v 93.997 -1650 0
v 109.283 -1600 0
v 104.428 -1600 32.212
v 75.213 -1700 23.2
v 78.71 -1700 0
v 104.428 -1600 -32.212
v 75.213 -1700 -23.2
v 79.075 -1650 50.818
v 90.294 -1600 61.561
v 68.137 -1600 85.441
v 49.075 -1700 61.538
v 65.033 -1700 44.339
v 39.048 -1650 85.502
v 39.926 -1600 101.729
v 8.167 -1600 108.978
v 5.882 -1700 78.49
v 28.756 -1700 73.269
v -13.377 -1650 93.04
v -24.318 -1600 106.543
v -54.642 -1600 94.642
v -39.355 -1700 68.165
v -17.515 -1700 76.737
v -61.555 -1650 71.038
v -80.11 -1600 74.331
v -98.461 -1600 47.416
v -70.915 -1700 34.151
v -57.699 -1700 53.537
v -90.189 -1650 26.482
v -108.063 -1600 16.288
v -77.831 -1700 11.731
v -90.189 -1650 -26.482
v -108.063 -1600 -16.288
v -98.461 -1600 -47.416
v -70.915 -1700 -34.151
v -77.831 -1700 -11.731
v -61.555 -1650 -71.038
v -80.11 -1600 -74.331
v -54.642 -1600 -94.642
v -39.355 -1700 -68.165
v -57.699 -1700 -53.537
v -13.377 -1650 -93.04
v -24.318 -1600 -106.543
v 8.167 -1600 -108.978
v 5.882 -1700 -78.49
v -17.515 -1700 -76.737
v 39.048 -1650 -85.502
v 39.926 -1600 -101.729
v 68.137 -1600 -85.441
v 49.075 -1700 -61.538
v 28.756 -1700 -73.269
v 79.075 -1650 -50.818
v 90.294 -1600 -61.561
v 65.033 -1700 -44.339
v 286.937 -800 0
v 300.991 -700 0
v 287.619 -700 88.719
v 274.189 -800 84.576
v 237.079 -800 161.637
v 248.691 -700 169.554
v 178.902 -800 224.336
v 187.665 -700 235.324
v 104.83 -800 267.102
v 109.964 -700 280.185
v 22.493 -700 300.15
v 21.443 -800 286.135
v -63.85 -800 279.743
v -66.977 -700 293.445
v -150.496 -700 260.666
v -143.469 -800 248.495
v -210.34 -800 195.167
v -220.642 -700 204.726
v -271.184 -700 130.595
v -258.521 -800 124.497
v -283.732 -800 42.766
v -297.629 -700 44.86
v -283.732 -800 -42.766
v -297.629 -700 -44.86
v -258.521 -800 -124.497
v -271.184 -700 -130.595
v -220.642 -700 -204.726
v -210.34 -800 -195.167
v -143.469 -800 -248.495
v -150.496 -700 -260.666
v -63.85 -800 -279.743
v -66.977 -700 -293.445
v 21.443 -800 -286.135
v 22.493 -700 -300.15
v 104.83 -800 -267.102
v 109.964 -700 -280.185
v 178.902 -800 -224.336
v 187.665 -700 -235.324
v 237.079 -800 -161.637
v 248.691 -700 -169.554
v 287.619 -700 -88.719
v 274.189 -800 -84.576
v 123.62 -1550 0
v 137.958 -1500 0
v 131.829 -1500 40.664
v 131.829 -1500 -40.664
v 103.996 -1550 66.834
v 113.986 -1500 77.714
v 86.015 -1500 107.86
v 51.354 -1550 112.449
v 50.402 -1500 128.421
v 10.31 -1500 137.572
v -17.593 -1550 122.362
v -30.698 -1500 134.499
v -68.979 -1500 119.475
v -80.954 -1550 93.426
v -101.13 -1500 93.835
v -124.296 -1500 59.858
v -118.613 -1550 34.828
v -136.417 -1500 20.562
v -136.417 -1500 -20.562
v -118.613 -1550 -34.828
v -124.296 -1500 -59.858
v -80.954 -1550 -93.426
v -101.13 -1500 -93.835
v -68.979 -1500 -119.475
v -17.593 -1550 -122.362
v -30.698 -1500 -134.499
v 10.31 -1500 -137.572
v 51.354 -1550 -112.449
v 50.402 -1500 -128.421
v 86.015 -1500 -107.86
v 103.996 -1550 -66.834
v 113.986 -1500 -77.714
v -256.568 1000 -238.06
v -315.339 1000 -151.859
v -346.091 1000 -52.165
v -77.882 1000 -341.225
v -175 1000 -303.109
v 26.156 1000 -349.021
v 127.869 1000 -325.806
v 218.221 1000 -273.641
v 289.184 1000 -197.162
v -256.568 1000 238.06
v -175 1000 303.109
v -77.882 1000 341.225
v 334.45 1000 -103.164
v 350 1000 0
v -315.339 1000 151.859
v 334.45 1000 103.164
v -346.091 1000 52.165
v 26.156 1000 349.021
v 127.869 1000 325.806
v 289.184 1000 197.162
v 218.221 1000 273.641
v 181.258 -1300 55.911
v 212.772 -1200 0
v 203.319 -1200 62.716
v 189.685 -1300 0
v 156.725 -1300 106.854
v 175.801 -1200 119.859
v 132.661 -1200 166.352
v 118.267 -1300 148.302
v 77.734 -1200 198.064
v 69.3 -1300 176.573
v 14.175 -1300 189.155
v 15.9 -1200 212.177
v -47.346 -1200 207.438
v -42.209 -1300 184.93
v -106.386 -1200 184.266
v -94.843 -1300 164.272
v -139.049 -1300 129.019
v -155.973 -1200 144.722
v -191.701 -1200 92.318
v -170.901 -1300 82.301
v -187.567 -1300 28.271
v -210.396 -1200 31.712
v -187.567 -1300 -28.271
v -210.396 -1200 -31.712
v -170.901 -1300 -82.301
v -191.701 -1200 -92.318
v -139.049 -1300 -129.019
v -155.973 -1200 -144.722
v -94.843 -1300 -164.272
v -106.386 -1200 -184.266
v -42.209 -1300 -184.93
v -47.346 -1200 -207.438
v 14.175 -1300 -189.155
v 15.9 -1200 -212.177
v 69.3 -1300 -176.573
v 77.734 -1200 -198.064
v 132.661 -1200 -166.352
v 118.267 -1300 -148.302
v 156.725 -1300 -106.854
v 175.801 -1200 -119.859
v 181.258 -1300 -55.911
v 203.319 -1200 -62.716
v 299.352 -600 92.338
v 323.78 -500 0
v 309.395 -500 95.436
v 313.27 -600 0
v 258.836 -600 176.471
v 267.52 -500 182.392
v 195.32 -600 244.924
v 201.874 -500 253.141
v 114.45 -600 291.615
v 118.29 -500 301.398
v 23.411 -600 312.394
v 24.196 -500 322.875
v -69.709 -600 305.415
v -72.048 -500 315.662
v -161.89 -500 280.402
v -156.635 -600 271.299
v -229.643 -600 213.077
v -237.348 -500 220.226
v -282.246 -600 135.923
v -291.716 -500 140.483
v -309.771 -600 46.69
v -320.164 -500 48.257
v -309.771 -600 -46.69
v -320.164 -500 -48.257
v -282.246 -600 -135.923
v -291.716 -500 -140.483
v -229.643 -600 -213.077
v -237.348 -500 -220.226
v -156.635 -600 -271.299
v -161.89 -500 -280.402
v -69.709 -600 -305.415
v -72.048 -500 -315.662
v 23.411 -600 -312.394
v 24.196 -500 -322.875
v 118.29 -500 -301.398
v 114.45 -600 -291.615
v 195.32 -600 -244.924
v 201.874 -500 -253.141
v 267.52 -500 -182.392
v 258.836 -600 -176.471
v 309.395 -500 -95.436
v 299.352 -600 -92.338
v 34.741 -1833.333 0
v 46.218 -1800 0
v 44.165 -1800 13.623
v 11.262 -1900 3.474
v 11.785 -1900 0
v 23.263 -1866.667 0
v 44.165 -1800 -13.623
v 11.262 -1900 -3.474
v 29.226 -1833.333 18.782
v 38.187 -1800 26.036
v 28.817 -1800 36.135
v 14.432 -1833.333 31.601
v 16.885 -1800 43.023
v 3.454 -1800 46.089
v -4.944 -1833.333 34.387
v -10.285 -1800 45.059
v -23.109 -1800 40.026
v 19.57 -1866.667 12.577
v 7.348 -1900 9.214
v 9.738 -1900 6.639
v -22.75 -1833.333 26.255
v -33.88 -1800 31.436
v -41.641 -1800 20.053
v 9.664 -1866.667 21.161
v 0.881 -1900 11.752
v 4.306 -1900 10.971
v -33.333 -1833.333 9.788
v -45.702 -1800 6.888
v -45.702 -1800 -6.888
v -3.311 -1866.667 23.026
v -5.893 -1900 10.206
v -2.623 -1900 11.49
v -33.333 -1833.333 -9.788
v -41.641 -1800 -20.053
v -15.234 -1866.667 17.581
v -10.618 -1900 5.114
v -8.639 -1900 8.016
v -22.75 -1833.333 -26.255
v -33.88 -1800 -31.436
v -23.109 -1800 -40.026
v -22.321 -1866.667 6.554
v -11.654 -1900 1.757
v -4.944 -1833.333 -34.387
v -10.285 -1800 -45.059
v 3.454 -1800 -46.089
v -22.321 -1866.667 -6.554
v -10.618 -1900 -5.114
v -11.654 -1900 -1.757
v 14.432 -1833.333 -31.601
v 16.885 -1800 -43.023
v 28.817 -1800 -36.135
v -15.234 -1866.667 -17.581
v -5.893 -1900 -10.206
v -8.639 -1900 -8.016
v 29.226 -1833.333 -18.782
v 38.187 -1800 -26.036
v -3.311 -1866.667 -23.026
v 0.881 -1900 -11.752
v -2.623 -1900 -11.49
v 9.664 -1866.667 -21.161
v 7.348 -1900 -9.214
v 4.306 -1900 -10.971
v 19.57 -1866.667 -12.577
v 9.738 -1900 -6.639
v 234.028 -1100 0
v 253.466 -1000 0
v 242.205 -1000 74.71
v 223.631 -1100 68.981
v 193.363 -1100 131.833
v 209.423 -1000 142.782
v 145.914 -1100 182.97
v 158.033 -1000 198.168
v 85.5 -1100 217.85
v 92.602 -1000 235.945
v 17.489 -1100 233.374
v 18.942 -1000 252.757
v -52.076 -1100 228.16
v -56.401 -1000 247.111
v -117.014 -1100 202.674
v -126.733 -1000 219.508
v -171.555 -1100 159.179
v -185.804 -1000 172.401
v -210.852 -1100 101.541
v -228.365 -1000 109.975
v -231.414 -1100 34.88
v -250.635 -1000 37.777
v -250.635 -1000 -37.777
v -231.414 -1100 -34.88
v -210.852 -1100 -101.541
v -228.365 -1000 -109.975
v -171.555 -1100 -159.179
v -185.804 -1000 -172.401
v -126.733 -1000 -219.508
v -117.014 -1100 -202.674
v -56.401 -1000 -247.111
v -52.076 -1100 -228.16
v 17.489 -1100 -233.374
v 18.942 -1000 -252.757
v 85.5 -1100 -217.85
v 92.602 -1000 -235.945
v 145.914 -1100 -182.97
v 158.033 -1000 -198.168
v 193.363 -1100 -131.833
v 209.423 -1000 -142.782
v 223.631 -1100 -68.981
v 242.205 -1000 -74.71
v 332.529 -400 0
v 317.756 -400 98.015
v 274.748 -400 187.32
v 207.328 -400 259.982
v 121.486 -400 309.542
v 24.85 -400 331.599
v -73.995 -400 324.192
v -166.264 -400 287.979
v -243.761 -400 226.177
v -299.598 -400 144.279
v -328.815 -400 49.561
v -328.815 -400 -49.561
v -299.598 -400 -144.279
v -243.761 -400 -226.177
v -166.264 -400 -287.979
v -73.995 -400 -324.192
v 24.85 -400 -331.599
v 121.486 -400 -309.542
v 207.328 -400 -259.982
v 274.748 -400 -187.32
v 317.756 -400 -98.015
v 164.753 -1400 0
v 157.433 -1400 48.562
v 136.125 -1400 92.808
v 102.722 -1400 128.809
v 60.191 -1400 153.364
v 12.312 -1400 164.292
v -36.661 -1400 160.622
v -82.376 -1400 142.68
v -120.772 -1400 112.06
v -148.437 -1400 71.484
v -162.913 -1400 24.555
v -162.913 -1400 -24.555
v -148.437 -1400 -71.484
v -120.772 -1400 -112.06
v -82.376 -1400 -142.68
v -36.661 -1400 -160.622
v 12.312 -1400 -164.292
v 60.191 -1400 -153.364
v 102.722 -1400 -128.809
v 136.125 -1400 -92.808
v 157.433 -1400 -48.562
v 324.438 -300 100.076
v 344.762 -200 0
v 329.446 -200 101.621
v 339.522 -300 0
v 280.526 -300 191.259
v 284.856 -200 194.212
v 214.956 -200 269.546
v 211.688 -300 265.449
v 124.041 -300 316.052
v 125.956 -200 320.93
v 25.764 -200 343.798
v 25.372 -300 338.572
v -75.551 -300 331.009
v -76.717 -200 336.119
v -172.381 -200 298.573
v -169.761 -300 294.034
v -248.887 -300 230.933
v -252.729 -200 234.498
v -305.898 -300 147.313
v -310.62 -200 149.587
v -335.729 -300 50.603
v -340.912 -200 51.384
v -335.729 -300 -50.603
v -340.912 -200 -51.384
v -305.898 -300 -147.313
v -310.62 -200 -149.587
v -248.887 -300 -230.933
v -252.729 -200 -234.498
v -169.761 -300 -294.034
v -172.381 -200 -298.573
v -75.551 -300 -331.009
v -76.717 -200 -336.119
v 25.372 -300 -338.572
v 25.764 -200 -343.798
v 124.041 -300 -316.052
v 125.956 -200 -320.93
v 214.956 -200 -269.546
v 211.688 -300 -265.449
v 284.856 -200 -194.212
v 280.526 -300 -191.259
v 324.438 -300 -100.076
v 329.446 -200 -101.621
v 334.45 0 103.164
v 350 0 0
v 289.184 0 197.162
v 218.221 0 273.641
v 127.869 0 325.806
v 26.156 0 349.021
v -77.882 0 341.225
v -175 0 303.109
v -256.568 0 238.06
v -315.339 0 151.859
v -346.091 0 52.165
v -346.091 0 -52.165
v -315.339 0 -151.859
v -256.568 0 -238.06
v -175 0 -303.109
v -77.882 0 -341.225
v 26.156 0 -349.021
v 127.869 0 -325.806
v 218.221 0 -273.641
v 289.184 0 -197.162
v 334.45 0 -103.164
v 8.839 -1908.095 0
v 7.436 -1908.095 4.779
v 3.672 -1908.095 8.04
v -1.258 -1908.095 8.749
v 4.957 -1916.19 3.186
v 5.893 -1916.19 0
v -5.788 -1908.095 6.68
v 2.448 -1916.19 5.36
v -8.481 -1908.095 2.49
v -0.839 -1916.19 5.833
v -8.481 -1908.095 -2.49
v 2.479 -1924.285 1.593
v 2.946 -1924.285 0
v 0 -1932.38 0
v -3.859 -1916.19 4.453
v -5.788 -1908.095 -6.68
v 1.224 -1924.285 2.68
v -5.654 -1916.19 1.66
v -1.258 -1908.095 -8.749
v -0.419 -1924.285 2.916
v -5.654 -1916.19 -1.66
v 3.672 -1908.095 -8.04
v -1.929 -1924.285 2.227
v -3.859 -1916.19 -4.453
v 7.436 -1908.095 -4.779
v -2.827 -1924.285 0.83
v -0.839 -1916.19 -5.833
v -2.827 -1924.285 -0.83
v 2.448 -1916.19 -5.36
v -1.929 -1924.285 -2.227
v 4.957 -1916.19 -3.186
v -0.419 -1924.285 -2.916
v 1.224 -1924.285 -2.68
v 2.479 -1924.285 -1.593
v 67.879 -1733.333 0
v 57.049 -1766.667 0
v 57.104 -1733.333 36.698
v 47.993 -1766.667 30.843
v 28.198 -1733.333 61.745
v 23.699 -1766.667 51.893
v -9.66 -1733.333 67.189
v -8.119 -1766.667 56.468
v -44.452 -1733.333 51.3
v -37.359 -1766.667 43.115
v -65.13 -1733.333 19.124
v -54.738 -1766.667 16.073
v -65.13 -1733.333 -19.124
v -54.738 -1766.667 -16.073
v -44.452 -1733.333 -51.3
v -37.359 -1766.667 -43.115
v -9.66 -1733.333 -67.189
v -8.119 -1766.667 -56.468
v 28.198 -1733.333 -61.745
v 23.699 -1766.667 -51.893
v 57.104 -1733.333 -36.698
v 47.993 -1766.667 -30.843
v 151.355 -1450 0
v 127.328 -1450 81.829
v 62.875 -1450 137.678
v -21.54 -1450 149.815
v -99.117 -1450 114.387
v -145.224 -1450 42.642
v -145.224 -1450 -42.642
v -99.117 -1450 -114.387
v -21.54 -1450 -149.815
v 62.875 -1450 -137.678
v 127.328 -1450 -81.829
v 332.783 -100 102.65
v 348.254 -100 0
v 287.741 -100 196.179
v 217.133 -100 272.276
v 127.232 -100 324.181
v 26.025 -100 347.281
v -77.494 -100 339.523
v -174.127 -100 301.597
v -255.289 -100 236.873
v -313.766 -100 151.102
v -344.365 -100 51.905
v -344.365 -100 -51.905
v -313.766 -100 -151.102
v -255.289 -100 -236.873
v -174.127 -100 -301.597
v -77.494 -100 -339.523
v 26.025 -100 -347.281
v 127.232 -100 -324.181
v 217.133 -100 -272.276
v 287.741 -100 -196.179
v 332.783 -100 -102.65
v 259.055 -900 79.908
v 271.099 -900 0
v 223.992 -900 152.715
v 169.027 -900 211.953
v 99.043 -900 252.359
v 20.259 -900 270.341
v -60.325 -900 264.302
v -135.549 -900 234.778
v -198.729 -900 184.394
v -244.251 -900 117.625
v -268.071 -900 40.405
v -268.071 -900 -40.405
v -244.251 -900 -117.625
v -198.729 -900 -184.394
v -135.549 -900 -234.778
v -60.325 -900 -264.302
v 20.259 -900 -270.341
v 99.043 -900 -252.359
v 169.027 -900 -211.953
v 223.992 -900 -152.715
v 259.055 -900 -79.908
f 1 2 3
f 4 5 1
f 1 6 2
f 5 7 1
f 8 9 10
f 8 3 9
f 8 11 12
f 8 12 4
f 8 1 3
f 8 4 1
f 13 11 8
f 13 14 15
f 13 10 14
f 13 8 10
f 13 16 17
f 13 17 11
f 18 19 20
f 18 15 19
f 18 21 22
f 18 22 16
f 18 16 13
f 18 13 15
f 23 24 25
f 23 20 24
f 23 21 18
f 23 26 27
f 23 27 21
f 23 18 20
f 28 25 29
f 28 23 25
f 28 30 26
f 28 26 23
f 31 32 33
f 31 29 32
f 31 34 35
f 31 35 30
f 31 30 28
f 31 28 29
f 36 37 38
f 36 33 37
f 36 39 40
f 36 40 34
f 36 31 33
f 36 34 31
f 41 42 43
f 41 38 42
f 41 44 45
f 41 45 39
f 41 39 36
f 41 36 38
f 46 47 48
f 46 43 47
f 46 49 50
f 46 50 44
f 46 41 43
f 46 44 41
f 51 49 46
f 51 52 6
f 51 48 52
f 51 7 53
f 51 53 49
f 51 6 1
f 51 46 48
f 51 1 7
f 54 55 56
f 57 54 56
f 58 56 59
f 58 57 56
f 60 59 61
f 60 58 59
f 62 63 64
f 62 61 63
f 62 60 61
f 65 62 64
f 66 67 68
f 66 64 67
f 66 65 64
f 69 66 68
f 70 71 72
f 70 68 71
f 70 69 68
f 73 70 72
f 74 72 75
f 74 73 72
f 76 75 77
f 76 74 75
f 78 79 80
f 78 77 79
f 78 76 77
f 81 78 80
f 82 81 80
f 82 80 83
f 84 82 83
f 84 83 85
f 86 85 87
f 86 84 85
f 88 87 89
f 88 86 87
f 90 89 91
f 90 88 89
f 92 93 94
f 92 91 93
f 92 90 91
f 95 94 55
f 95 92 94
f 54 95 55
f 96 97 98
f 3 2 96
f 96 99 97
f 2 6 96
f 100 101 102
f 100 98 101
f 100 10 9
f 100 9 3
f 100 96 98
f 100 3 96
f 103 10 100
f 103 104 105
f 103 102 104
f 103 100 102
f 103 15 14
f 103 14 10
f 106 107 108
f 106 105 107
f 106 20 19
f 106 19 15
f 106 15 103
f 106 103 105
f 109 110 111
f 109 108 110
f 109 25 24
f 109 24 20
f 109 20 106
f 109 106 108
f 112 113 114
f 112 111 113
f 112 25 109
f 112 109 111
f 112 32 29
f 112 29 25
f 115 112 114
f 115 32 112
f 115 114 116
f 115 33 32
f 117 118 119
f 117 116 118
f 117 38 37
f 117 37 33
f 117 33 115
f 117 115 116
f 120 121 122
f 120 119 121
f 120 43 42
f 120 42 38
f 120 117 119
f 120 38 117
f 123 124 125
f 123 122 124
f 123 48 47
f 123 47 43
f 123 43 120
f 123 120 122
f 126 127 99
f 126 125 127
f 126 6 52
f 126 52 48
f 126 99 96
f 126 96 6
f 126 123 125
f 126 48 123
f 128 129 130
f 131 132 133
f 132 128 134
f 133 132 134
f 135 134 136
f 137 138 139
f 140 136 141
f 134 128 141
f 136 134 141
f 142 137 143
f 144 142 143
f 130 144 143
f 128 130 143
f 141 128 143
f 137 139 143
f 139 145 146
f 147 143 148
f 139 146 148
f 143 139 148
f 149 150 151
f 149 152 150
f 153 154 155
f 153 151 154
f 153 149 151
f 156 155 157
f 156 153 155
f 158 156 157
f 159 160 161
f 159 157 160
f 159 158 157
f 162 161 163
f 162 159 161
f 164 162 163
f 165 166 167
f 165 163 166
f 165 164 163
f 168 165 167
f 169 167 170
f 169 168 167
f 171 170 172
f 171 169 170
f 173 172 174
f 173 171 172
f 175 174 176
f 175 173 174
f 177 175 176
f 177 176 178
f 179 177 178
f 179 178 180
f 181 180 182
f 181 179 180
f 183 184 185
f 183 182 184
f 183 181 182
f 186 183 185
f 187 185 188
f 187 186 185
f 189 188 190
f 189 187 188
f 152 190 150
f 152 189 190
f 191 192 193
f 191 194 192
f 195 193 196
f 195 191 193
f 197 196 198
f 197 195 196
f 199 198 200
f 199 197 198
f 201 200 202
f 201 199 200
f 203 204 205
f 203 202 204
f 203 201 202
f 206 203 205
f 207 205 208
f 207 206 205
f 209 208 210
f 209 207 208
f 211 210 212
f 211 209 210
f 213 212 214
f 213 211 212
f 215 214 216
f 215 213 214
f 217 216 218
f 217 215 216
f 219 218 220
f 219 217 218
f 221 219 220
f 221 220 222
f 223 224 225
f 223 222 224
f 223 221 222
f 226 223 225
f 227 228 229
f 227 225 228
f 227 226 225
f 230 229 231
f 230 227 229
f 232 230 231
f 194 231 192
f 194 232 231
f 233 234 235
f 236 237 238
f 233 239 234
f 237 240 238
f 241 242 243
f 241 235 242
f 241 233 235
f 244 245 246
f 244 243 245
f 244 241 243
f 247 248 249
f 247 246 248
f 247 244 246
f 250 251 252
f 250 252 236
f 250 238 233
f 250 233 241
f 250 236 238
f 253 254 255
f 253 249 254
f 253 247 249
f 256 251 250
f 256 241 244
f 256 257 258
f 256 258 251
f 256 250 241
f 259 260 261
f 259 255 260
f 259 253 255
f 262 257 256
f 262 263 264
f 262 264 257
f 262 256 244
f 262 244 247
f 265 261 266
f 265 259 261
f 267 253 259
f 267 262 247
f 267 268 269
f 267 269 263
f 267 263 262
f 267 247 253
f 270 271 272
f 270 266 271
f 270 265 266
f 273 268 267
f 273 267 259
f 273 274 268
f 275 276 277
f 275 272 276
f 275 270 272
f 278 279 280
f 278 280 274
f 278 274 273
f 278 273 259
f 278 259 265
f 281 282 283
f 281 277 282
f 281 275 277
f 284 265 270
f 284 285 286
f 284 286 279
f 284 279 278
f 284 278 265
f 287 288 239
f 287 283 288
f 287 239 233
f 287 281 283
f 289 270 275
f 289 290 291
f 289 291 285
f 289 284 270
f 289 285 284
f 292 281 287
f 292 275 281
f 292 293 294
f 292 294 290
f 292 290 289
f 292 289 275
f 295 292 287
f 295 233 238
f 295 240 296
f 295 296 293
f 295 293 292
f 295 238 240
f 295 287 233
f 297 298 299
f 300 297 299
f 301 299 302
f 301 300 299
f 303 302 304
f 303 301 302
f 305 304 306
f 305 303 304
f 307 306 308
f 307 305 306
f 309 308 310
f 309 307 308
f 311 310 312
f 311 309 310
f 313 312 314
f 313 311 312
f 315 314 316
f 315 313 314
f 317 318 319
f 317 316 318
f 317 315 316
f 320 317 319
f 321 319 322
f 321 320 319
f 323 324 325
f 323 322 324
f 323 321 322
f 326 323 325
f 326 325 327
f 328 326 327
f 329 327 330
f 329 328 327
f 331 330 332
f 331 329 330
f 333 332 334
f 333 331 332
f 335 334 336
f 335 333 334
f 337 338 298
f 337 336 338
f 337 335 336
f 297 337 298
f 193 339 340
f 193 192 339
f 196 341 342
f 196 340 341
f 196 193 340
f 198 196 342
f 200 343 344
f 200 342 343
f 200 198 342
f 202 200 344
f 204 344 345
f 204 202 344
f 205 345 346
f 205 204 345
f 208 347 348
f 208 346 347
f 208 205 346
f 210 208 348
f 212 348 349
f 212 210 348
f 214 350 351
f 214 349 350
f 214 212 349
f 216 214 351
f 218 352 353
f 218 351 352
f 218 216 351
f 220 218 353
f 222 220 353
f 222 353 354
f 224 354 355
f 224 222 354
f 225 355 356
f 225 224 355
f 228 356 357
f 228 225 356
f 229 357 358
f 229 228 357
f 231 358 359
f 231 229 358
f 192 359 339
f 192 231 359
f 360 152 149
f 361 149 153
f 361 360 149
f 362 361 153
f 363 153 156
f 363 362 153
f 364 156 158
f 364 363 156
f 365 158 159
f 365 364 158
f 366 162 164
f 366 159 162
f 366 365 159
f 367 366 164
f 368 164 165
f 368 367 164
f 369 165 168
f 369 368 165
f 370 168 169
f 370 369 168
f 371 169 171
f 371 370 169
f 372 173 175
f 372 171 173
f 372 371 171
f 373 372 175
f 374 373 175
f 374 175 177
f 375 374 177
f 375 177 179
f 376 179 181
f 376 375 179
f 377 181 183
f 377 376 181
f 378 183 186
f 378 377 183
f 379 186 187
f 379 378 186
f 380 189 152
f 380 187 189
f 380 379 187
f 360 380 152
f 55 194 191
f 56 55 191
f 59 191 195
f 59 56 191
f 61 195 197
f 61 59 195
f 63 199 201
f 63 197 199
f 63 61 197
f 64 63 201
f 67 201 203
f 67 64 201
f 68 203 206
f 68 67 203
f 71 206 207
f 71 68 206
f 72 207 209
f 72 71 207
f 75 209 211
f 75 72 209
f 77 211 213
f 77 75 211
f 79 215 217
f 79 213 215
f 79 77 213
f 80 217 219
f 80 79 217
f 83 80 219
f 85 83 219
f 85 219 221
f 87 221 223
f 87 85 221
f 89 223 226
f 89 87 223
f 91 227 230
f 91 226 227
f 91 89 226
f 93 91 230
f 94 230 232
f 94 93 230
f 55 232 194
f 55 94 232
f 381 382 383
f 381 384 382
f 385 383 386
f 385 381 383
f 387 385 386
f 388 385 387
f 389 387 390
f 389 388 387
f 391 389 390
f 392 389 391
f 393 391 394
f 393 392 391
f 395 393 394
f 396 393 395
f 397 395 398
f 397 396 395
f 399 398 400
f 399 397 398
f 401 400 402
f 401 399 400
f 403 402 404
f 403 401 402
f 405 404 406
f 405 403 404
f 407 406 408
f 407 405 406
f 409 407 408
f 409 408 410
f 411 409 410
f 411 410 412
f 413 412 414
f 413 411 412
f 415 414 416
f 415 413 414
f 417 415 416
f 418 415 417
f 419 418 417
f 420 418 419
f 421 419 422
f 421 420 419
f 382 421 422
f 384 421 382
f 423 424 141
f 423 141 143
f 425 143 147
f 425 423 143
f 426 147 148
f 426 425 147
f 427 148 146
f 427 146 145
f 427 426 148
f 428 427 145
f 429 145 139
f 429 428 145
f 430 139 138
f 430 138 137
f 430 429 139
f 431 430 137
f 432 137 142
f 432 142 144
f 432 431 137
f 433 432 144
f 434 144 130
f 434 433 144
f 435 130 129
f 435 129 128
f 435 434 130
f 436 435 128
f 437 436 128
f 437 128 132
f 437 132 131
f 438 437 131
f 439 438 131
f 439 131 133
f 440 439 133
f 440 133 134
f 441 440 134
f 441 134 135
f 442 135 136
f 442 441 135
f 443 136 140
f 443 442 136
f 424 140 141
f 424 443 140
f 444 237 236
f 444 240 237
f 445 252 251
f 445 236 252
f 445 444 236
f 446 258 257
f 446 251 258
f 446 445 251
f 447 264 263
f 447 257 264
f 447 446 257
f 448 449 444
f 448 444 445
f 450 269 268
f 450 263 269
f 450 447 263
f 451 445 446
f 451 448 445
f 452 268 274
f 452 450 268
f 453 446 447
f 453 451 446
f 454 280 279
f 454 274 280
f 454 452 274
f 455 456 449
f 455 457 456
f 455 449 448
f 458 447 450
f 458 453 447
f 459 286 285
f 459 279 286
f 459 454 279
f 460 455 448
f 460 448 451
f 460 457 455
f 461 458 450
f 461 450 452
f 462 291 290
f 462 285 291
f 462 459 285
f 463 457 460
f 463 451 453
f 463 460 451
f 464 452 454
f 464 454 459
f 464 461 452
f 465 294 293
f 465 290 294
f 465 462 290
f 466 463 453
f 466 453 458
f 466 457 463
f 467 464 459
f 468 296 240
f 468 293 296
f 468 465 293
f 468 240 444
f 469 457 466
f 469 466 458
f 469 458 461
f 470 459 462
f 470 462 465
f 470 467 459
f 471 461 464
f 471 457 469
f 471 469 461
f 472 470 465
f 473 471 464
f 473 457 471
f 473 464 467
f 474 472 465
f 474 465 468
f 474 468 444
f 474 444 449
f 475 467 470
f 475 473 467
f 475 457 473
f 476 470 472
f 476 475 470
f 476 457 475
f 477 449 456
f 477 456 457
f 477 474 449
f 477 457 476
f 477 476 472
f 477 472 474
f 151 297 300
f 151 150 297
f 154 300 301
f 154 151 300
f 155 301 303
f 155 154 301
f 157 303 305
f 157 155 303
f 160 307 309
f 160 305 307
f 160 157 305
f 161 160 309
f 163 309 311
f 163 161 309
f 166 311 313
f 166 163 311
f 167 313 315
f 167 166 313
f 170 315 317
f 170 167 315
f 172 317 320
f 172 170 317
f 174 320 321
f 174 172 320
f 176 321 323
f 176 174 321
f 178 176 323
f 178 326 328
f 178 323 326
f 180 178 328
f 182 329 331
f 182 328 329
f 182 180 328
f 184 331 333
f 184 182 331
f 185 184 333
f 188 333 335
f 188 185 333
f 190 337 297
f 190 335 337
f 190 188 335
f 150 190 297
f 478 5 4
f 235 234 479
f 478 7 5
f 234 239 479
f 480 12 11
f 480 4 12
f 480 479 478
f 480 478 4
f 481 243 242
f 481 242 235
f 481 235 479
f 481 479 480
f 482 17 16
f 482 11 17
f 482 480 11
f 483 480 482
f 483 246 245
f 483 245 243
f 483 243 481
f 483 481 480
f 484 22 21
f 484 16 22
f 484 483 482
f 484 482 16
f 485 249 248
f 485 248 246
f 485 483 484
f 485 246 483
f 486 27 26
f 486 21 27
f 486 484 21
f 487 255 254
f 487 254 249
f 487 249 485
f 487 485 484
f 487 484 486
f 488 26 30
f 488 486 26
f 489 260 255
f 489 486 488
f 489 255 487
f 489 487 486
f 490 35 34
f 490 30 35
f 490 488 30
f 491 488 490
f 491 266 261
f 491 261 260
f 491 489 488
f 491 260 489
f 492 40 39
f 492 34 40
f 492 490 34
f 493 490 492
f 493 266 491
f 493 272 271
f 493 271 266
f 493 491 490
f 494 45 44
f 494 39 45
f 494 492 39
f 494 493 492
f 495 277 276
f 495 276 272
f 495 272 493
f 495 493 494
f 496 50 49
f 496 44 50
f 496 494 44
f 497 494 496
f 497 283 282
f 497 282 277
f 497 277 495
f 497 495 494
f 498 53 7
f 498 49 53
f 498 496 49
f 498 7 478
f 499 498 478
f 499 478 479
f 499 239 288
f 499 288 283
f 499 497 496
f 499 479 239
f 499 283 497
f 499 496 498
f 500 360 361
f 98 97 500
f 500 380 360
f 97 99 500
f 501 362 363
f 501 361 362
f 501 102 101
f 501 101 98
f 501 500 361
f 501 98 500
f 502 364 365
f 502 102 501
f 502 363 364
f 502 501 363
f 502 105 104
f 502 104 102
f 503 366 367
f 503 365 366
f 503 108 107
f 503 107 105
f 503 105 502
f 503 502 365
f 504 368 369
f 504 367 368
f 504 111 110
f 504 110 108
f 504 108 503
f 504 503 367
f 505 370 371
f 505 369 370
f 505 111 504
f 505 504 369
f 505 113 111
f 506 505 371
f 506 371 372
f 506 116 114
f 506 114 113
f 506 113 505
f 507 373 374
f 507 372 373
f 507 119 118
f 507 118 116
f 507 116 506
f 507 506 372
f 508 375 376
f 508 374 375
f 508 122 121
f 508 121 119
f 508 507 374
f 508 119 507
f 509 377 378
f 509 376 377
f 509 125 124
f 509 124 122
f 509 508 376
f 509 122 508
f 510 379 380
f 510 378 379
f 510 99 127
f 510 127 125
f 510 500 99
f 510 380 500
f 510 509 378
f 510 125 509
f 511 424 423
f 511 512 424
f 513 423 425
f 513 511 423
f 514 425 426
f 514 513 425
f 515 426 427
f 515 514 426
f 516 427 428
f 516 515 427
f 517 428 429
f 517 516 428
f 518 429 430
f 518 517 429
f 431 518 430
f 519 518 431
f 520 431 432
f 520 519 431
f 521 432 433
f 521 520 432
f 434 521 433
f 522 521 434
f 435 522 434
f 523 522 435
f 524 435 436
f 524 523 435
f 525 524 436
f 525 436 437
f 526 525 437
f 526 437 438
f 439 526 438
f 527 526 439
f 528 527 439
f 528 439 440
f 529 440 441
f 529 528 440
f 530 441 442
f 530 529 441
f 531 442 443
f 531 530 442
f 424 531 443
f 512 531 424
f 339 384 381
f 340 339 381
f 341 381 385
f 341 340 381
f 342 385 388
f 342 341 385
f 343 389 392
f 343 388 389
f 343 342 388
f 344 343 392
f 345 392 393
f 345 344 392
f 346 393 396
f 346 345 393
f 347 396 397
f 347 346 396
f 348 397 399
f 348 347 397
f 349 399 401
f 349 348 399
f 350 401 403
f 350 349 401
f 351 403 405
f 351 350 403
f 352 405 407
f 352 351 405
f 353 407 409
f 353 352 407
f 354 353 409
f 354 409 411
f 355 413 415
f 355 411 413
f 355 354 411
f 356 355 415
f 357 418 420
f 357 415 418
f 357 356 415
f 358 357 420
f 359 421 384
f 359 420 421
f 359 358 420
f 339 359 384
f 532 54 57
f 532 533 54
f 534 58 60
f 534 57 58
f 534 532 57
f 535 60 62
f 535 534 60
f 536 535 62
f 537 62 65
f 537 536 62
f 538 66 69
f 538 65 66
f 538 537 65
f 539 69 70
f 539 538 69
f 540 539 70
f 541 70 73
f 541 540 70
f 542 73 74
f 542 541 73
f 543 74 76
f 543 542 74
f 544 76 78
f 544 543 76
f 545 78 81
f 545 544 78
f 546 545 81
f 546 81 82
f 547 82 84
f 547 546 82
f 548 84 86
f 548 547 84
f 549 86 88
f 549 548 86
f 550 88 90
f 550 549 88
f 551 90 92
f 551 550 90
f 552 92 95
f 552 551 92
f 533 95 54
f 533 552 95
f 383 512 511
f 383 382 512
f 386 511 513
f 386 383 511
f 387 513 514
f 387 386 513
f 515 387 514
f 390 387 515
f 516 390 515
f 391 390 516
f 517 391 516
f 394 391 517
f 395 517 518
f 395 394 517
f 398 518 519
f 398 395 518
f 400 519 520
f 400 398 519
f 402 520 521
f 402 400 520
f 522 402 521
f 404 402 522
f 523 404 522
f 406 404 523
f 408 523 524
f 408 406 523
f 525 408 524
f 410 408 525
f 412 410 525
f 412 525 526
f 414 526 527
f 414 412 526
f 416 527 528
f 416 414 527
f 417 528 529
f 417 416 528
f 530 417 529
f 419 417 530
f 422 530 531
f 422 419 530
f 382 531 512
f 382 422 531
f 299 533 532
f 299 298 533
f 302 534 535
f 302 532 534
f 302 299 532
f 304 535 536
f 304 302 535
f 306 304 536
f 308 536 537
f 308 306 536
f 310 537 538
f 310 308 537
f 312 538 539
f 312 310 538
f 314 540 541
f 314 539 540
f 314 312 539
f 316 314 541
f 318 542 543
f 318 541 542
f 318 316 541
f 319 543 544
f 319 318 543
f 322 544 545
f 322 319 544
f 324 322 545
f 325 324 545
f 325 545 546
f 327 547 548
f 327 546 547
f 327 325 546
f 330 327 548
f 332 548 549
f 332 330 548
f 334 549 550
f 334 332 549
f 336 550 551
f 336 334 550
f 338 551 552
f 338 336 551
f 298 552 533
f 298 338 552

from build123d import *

# Parameters (mm, degrees)
F0_R       = 350
F1_DEPTH   = 100
F1_TAPER   = 1
F1_FACE_R  = 348.2544935072
F2_DEPTH   = 100
F2_TAPER   = 2
F2_FACE_R  = 344.762416558
F3_DEPTH   = 100
F3_TAPER   = 3
F3_FACE_R  = 339.5216386297
F4_DEPTH   = 100
F4_TAPER   = 4
F4_FACE_R  = 332.5289574353
F5_DEPTH   = 100
F5_TAPER   = 5
F5_FACE_R  = 323.7800910828
F6_DEPTH   = 100
F6_TAPER   = 6
F6_FACE_R  = 313.2696675562
F7_DEPTH   = 100
F7_TAPER   = 7
F7_FACE_R  = 300.9912114659
F8_DEPTH   = 100
F8_TAPER   = 8
F8_FACE_R  = 286.9371279957
F9_DEPTH   = 100
F9_TAPER   = 9
F9_FACE_R  = 271.0986839632
F10_DEPTH  = 100
F10_TAPER  = 10
F10_FACE_R = 253.4659858924
F11_DEPTH  = 100
F11_TAPER  = 11
F11_FACE_R = 234.0279549786
F12_DEPTH  = 100
F12_TAPER  = 12
F12_FACE_R = 212.7722988116
F13_DEPTH  = 100
F13_TAPER  = 13
F13_FACE_R = 189.685479699
F14_DEPTH  = 100
F14_TAPER  = 14
F14_FACE_R = 164.7526794147
F15_DEPTH  = 100
F15_TAPER  = 15
F15_FACE_R = 137.9577601716
F16_DEPTH  = 100
F16_TAPER  = 16
F16_FACE_R = 109.2832215957
F17_DEPTH  = 100
F17_TAPER  = 17
F17_FACE_R = 78.7101534499
F18_DEPTH  = 100
F18_TAPER  = 18
F18_FACE_R = 46.2181838266
F19_DEPTH  = 100
F19_TAPER  = 19
F19_FACE_R = 11.7854224976
F21_DEPTH  = 1000


# Not quite as in the source:
# - an extrude whose draft closes it to a point is written as a loft to that point


with BuildPart() as f1:
    # F0 (on Front) → F1 (new body)
    with BuildSketch(Plane.XZ):
        Circle(F0_R)
    extrude(amount=F1_DEPTH, taper=F1_TAPER)

    # F1_face (on face) → F2 (join)
    with BuildSketch(Plane.XZ.offset(100)):
        Circle(F1_FACE_R)
    extrude(amount=F2_DEPTH, taper=F2_TAPER)

    # F2_face (on face) → F3 (join)
    with BuildSketch(Plane.XZ.offset(200)):
        Circle(F2_FACE_R)
    extrude(amount=F3_DEPTH, taper=F3_TAPER)

    # F3_face (on face) → F4 (join)
    with BuildSketch(Plane.XZ.offset(300)):
        Circle(F3_FACE_R)
    extrude(amount=F4_DEPTH, taper=F4_TAPER)

    # F4_face (on face) → F5 (join)
    with BuildSketch(Plane.XZ.offset(400)):
        Circle(F4_FACE_R)
    extrude(amount=F5_DEPTH, taper=F5_TAPER)

    # F5_face (on face) → F6 (join)
    with BuildSketch(Plane.XZ.offset(500)):
        Circle(F5_FACE_R)
    extrude(amount=F6_DEPTH, taper=F6_TAPER)

    # F6_face (on face) → F7 (join)
    with BuildSketch(Plane.XZ.offset(600)):
        Circle(F6_FACE_R)
    extrude(amount=F7_DEPTH, taper=F7_TAPER)

    # F7_face (on face) → F8 (join)
    with BuildSketch(Plane.XZ.offset(700)):
        Circle(F7_FACE_R)
    extrude(amount=F8_DEPTH, taper=F8_TAPER)

    # F8_face (on face) → F9 (join)
    with BuildSketch(Plane.XZ.offset(800)):
        Circle(F8_FACE_R)
    extrude(amount=F9_DEPTH, taper=F9_TAPER)

    # F9_face (on face) → F10 (join)
    with BuildSketch(Plane.XZ.offset(900)):
        Circle(F9_FACE_R)
    extrude(amount=F10_DEPTH, taper=F10_TAPER)

    # F10_face (on face) → F11 (join)
    with BuildSketch(Plane.XZ.offset(1000)):
        Circle(F10_FACE_R)
    extrude(amount=F11_DEPTH, taper=F11_TAPER)

    # F11_face (on face) → F12 (join)
    with BuildSketch(Plane.XZ.offset(1100)):
        Circle(F11_FACE_R)
    extrude(amount=F12_DEPTH, taper=F12_TAPER)

    # F12_face (on face) → F13 (join)
    with BuildSketch(Plane.XZ.offset(1200)):
        Circle(F12_FACE_R)
    extrude(amount=F13_DEPTH, taper=F13_TAPER)

    # F13_face (on face) → F14 (join)
    with BuildSketch(Plane.XZ.offset(1300)):
        Circle(F13_FACE_R)
    extrude(amount=F14_DEPTH, taper=F14_TAPER)

    # F14_face (on face) → F15 (join)
    with BuildSketch(Plane.XZ.offset(1400)):
        Circle(F14_FACE_R)
    extrude(amount=F15_DEPTH, taper=F15_TAPER)

    # F15_face (on face) → F16 (join)
    with BuildSketch(Plane.XZ.offset(1500)):
        Circle(F15_FACE_R)
    extrude(amount=F16_DEPTH, taper=F16_TAPER)

    # F16_face (on face) → F17 (join)
    with BuildSketch(Plane.XZ.offset(1600)):
        Circle(F16_FACE_R)
    extrude(amount=F17_DEPTH, taper=F17_TAPER)

    # F17_face (on face) → F18 (join)
    with BuildSketch(Plane.XZ.offset(1700)):
        Circle(F17_FACE_R)
    extrude(amount=F18_DEPTH, taper=F18_TAPER)

    # F18_face (on face) → F19 (join)
    with BuildSketch(Plane.XZ.offset(1800)):
        Circle(F18_FACE_R)
    extrude(amount=F19_DEPTH, taper=F19_TAPER)

    # F19_face (on face) → F20 section 0
    with BuildSketch(Plane.XZ.offset(1900), mode=Mode.PRIVATE) as f20_s0:
        Circle(F19_FACE_R)
    loft([f20_s0.sketch, Vertex(0, -1932.3801821909, 0)], ruled=True)

    # F21 (add): a face of the model
    f21_faces = [f1.faces().sort_by_distance(p)[0] for p in [
        (0, 0, 0),
    ]]
    extrude(f21_faces, amount=F21_DEPTH)


solid = f1.part
